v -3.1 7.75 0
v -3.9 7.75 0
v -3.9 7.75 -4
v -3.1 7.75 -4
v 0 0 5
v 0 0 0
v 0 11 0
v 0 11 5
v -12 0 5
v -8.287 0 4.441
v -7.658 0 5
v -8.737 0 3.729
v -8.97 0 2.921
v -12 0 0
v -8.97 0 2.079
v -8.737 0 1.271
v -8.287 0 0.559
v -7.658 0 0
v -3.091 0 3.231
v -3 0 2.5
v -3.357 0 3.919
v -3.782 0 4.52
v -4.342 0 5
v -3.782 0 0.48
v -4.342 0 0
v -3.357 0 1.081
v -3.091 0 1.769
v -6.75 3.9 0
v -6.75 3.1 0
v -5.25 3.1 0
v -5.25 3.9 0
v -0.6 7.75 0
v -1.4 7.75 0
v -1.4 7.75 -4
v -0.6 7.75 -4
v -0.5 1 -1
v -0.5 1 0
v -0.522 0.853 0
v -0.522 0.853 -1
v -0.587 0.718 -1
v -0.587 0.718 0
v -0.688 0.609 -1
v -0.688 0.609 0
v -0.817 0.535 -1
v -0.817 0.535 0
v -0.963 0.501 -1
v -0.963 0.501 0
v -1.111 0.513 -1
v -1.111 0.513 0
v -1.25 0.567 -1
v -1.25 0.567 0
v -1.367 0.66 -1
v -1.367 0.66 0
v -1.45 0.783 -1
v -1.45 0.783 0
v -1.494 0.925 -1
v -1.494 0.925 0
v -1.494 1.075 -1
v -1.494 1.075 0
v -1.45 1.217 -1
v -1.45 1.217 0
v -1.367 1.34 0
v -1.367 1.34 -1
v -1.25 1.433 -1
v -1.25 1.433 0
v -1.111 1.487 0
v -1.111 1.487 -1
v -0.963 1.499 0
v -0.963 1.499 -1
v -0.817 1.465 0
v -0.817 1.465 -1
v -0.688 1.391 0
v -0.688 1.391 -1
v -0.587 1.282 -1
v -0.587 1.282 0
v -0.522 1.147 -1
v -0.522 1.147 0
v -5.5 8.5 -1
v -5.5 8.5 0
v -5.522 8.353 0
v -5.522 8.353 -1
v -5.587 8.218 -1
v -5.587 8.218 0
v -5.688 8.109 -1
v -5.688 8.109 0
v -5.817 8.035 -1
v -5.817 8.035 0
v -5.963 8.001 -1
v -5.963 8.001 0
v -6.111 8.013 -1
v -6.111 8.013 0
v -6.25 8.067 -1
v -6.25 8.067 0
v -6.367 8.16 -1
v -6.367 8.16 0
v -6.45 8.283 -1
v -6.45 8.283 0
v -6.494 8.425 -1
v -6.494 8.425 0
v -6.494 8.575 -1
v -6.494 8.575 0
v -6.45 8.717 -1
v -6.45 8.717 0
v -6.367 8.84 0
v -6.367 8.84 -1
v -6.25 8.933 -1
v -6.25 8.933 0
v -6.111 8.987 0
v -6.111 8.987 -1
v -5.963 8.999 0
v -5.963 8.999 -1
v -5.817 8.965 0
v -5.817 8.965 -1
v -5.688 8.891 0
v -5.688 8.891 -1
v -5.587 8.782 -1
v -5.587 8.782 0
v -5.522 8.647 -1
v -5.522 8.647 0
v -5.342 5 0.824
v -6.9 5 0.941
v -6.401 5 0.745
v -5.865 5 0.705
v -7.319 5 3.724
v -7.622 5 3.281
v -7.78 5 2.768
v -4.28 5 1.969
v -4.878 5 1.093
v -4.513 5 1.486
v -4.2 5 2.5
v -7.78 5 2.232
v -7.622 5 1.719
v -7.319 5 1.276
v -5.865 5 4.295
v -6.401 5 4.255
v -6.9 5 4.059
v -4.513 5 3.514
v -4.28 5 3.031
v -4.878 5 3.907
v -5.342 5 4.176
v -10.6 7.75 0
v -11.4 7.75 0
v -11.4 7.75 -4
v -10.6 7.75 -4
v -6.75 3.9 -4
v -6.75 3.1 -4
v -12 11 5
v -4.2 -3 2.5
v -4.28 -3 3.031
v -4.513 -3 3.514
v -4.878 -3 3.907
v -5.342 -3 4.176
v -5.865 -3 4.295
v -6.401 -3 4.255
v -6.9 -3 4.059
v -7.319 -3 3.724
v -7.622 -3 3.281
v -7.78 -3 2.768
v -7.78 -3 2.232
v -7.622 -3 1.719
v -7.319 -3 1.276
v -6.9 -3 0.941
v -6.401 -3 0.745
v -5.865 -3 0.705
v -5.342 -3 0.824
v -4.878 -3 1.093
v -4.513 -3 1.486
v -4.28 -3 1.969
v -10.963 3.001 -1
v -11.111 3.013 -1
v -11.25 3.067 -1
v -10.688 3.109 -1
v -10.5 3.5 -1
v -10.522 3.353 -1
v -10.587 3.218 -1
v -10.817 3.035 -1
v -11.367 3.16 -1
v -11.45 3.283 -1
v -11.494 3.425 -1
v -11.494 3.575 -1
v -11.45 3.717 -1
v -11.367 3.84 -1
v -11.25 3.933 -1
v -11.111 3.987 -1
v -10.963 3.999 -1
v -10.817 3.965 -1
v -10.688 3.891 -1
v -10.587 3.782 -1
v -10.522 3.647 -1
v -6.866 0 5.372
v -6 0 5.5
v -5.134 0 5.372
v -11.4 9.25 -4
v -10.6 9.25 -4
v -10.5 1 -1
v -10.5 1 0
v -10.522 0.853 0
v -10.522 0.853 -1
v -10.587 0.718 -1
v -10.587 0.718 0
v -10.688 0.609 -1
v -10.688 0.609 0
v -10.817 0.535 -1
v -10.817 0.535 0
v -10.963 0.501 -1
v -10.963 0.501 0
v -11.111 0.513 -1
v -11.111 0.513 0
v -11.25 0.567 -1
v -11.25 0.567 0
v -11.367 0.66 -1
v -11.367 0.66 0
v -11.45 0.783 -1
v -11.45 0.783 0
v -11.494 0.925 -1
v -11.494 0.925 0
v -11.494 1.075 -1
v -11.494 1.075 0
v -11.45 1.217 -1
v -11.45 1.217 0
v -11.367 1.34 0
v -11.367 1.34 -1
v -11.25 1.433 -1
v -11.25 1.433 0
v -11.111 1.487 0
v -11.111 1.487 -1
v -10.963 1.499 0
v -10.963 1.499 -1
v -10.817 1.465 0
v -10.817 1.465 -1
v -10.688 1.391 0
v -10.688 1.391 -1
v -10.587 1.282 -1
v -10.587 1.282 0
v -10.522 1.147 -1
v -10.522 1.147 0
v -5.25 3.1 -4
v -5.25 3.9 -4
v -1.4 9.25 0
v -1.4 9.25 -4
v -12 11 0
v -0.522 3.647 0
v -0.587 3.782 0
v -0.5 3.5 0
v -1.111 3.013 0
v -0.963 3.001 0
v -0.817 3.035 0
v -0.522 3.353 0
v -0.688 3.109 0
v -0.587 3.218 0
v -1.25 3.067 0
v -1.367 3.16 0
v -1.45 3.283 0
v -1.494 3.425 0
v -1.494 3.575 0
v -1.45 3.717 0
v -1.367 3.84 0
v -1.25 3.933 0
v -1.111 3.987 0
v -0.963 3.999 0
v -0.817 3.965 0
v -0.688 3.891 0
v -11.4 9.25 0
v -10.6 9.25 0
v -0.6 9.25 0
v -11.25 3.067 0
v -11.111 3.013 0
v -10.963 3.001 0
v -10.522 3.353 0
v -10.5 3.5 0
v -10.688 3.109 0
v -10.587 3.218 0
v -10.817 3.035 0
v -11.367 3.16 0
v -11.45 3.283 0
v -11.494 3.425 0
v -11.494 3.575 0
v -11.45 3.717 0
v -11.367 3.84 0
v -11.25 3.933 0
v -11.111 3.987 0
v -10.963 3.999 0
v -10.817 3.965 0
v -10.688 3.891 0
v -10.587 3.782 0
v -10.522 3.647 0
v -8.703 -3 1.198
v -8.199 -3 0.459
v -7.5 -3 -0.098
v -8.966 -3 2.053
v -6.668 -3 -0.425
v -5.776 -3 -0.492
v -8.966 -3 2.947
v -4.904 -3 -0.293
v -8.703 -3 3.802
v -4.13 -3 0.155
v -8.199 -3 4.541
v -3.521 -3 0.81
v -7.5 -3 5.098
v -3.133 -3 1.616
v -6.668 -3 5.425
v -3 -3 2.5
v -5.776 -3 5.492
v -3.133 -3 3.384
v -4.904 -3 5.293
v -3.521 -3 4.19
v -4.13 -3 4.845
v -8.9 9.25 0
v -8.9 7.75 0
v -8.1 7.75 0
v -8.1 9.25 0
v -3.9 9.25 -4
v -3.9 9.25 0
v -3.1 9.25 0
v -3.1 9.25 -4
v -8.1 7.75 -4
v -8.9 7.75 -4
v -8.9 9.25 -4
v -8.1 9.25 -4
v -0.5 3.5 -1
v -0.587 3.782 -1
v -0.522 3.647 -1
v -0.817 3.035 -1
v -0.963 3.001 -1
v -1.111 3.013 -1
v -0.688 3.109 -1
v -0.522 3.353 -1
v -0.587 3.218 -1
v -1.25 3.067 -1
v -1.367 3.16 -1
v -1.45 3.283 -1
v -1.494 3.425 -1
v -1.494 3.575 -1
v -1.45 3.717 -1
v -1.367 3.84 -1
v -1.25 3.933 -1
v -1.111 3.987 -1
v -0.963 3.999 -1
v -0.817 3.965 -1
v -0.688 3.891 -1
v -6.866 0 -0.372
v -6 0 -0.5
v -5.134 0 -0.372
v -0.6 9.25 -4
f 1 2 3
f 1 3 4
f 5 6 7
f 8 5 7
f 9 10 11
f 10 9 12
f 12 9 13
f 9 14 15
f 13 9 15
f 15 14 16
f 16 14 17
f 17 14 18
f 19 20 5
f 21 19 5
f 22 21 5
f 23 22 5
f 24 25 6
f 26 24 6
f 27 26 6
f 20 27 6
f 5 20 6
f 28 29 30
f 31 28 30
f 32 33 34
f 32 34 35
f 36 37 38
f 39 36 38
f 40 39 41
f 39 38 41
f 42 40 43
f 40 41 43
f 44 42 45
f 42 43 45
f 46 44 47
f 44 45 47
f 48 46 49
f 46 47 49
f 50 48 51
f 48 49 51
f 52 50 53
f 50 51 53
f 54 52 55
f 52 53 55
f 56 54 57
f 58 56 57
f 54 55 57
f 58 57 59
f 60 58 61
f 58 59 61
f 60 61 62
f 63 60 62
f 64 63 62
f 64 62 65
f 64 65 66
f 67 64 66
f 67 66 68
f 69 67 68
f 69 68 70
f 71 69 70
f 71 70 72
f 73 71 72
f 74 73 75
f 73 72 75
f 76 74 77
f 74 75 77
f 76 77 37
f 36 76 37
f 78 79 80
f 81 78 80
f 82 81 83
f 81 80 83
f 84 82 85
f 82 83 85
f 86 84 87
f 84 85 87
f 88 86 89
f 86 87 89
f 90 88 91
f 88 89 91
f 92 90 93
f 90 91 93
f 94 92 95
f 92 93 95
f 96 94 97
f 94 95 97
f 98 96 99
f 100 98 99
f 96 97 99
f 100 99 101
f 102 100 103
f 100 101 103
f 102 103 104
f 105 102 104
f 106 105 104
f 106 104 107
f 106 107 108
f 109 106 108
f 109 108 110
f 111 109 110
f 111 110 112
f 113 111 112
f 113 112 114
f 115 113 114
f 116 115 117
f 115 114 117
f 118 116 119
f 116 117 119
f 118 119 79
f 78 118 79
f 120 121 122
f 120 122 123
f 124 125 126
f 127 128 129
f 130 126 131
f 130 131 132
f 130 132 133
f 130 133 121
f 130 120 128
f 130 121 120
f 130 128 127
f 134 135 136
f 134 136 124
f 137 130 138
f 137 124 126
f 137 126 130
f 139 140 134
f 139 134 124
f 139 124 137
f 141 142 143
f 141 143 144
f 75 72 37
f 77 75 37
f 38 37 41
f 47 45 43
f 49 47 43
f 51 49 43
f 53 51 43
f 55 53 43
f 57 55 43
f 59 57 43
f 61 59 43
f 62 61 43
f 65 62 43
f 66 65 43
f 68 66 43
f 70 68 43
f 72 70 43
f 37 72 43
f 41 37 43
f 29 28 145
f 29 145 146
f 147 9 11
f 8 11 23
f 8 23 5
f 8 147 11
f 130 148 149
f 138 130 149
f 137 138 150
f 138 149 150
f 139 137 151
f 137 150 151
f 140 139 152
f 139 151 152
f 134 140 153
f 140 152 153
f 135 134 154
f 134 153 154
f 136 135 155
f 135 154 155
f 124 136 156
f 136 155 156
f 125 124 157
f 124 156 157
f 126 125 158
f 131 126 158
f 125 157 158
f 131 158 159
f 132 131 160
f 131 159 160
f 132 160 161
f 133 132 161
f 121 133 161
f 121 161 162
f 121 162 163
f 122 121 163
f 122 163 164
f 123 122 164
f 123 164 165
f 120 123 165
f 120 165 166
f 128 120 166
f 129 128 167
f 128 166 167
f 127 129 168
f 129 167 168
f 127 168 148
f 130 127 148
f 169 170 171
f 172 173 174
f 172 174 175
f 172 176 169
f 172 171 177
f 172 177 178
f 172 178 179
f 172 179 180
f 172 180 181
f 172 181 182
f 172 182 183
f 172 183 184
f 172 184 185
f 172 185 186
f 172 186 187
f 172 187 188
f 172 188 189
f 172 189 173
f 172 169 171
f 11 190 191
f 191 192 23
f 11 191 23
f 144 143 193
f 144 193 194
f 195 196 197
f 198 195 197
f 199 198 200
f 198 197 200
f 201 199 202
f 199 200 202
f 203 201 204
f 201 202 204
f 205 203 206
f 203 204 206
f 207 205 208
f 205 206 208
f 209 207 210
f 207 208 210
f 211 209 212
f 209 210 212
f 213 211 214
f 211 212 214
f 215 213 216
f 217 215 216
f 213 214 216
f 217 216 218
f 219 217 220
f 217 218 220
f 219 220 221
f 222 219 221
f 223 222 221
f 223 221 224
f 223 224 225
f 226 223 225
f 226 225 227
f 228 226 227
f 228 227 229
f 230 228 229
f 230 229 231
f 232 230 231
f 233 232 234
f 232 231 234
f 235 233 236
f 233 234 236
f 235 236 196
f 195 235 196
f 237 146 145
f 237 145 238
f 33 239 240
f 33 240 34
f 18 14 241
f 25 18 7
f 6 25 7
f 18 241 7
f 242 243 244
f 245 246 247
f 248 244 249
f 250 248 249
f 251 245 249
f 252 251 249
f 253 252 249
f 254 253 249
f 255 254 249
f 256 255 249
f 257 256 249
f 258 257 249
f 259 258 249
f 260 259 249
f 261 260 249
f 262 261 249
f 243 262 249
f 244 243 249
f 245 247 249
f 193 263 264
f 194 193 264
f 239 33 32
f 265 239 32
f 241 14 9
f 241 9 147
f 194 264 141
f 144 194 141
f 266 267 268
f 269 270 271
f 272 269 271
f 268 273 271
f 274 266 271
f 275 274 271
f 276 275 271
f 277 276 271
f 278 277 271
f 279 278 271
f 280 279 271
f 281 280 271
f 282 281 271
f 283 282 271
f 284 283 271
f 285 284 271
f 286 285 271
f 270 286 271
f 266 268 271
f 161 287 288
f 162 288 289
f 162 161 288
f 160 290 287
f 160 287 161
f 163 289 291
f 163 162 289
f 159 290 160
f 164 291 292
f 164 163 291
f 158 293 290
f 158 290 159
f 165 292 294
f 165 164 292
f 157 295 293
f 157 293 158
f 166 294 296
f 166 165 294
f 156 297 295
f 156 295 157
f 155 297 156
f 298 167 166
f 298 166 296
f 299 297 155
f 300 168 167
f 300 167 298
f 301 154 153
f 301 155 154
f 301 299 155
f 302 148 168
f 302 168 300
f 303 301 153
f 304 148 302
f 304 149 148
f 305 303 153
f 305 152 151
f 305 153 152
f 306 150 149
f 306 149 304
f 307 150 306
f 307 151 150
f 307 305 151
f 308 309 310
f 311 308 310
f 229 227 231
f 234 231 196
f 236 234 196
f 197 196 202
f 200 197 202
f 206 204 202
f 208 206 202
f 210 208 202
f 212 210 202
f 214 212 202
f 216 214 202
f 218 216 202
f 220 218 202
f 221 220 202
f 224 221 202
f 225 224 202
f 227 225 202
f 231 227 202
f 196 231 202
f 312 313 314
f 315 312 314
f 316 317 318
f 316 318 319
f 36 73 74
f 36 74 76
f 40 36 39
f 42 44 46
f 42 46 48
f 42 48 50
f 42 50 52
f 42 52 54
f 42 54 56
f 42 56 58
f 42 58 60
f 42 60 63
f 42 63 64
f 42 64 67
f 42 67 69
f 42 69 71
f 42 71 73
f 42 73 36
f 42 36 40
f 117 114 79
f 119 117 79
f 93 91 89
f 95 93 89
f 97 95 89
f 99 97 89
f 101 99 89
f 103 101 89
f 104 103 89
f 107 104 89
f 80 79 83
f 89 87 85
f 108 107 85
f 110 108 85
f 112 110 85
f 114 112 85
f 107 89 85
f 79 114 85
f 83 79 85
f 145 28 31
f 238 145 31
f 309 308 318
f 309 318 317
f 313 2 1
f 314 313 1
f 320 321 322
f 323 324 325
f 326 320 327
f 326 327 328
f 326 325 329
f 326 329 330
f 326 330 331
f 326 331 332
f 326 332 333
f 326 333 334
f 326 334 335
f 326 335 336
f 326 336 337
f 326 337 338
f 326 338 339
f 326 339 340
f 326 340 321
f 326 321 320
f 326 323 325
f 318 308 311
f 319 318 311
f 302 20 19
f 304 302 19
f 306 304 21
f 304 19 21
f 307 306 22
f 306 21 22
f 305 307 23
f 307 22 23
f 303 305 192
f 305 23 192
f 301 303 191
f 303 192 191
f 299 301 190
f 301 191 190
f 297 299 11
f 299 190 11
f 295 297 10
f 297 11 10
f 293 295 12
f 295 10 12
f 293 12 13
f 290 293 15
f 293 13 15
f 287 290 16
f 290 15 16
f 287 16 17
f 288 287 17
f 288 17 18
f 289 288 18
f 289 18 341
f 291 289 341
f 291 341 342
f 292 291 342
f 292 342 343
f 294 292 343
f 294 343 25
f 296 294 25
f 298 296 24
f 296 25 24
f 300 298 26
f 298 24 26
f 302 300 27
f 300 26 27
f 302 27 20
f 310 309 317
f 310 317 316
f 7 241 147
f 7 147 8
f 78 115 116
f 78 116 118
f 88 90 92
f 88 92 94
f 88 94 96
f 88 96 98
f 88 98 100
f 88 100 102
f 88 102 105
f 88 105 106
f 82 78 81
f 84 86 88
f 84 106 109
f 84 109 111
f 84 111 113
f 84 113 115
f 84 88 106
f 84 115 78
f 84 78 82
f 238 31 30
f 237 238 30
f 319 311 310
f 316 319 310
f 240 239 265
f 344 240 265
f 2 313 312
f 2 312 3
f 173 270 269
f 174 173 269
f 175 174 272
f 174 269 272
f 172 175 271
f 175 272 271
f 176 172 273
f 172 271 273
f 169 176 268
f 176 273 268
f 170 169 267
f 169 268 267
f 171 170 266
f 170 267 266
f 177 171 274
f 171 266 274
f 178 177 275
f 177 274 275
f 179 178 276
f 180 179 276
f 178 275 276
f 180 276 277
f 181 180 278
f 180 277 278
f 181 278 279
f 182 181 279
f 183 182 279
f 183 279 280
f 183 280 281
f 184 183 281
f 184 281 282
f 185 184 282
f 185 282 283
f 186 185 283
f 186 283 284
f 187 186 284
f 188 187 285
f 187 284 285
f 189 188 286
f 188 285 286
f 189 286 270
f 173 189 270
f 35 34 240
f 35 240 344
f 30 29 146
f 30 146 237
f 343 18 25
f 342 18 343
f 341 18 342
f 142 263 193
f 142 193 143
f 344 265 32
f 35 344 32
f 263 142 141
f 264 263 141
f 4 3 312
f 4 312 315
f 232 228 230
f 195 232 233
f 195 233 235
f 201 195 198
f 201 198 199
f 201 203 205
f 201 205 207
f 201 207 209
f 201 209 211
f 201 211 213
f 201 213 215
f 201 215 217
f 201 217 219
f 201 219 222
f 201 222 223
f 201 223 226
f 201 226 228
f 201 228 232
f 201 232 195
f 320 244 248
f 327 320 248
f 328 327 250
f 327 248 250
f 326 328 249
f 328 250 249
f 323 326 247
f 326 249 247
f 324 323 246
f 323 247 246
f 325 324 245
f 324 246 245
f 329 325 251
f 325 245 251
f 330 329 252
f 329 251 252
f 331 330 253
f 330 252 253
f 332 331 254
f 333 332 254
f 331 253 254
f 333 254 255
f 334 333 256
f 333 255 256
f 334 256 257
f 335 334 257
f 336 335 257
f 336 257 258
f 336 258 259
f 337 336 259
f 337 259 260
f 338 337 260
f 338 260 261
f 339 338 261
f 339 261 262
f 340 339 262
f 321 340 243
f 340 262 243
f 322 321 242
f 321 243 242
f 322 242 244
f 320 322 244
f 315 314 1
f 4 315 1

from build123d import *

# Parameters (mm, degrees)
SKETCH002_R   = 0.5
PAD002_DEPTH  = 1
SKETCH003_W   = 0.8
SKETCH003_H   = 1.5
SKETCH003_W_2 = 1.5
SKETCH003_H_2 = 0.8
PAD003_DEPTH  = 4
SKETCH_W      = 12
SKETCH_H      = 11
PAD_DEPTH     = 5
SKETCH001_R   = 3
PAD001_DEPTH  = 3
SKETCH004_R   = 1.8
POCKET_DEPTH  = 8


with BuildPart() as pad002:
    # Sketch002 → Pad002 (new body)
    with BuildSketch(Plane(origin=(0, 0, 0), x_dir=(1, 0, 0), z_dir=(0, 0, -1))):
        with Locations((-11, -1)):
            Circle(SKETCH002_R)
        with Locations((-1, -1)):
            Circle(SKETCH002_R)
        with Locations((-11, -3.5)):
            Circle(SKETCH002_R)
        with Locations((-1, -3.5)):
            Circle(SKETCH002_R)
        with Locations((-6, -8.5)):
            Circle(SKETCH002_R)
    extrude(amount=PAD002_DEPTH)


with BuildPart() as pad003:
    # Sketch003 → Pad003 (new body)
    with BuildSketch(Plane(origin=(0, 0, 0), x_dir=(1, 0, 0), z_dir=(0, 0, -1))):
        with Locations((-11, -8.5)):
            Rectangle(SKETCH003_W, SKETCH003_H)
        with Locations((-8.5, -8.5)):
            Rectangle(SKETCH003_W, SKETCH003_H)
        with Locations((-3.5, -8.5)):
            Rectangle(SKETCH003_W, SKETCH003_H)
        with Locations((-1, -8.5)):
            Rectangle(SKETCH003_W, SKETCH003_H)
        with Locations((-6, -3.5)):
            Rectangle(SKETCH003_W_2, SKETCH003_H_2)
    extrude(amount=PAD003_DEPTH)


with BuildPart() as pocket:
    # Sketch → Pad (new body)
    with BuildSketch(Plane.XY):
        with Locations((-6, 5.5)):
            Rectangle(SKETCH_W, SKETCH_H)
    extrude(amount=PAD_DEPTH)

    # Sketch001 → Pad001 (new body)
    with BuildSketch(Plane.XZ):
        with Locations((-6, 2.5)):
            Circle(SKETCH001_R)
    extrude(amount=PAD001_DEPTH)

    # Sketch004 → Pocket (cut)
    with BuildSketch(Plane.XZ.offset(3)):
        with Locations((-6, 2.5)):
            Circle(SKETCH004_R)
    extrude(amount=-POCKET_DEPTH, mode=Mode.SUBTRACT)


solid = Compound([pad002.part, pad003.part, pocket.part])
